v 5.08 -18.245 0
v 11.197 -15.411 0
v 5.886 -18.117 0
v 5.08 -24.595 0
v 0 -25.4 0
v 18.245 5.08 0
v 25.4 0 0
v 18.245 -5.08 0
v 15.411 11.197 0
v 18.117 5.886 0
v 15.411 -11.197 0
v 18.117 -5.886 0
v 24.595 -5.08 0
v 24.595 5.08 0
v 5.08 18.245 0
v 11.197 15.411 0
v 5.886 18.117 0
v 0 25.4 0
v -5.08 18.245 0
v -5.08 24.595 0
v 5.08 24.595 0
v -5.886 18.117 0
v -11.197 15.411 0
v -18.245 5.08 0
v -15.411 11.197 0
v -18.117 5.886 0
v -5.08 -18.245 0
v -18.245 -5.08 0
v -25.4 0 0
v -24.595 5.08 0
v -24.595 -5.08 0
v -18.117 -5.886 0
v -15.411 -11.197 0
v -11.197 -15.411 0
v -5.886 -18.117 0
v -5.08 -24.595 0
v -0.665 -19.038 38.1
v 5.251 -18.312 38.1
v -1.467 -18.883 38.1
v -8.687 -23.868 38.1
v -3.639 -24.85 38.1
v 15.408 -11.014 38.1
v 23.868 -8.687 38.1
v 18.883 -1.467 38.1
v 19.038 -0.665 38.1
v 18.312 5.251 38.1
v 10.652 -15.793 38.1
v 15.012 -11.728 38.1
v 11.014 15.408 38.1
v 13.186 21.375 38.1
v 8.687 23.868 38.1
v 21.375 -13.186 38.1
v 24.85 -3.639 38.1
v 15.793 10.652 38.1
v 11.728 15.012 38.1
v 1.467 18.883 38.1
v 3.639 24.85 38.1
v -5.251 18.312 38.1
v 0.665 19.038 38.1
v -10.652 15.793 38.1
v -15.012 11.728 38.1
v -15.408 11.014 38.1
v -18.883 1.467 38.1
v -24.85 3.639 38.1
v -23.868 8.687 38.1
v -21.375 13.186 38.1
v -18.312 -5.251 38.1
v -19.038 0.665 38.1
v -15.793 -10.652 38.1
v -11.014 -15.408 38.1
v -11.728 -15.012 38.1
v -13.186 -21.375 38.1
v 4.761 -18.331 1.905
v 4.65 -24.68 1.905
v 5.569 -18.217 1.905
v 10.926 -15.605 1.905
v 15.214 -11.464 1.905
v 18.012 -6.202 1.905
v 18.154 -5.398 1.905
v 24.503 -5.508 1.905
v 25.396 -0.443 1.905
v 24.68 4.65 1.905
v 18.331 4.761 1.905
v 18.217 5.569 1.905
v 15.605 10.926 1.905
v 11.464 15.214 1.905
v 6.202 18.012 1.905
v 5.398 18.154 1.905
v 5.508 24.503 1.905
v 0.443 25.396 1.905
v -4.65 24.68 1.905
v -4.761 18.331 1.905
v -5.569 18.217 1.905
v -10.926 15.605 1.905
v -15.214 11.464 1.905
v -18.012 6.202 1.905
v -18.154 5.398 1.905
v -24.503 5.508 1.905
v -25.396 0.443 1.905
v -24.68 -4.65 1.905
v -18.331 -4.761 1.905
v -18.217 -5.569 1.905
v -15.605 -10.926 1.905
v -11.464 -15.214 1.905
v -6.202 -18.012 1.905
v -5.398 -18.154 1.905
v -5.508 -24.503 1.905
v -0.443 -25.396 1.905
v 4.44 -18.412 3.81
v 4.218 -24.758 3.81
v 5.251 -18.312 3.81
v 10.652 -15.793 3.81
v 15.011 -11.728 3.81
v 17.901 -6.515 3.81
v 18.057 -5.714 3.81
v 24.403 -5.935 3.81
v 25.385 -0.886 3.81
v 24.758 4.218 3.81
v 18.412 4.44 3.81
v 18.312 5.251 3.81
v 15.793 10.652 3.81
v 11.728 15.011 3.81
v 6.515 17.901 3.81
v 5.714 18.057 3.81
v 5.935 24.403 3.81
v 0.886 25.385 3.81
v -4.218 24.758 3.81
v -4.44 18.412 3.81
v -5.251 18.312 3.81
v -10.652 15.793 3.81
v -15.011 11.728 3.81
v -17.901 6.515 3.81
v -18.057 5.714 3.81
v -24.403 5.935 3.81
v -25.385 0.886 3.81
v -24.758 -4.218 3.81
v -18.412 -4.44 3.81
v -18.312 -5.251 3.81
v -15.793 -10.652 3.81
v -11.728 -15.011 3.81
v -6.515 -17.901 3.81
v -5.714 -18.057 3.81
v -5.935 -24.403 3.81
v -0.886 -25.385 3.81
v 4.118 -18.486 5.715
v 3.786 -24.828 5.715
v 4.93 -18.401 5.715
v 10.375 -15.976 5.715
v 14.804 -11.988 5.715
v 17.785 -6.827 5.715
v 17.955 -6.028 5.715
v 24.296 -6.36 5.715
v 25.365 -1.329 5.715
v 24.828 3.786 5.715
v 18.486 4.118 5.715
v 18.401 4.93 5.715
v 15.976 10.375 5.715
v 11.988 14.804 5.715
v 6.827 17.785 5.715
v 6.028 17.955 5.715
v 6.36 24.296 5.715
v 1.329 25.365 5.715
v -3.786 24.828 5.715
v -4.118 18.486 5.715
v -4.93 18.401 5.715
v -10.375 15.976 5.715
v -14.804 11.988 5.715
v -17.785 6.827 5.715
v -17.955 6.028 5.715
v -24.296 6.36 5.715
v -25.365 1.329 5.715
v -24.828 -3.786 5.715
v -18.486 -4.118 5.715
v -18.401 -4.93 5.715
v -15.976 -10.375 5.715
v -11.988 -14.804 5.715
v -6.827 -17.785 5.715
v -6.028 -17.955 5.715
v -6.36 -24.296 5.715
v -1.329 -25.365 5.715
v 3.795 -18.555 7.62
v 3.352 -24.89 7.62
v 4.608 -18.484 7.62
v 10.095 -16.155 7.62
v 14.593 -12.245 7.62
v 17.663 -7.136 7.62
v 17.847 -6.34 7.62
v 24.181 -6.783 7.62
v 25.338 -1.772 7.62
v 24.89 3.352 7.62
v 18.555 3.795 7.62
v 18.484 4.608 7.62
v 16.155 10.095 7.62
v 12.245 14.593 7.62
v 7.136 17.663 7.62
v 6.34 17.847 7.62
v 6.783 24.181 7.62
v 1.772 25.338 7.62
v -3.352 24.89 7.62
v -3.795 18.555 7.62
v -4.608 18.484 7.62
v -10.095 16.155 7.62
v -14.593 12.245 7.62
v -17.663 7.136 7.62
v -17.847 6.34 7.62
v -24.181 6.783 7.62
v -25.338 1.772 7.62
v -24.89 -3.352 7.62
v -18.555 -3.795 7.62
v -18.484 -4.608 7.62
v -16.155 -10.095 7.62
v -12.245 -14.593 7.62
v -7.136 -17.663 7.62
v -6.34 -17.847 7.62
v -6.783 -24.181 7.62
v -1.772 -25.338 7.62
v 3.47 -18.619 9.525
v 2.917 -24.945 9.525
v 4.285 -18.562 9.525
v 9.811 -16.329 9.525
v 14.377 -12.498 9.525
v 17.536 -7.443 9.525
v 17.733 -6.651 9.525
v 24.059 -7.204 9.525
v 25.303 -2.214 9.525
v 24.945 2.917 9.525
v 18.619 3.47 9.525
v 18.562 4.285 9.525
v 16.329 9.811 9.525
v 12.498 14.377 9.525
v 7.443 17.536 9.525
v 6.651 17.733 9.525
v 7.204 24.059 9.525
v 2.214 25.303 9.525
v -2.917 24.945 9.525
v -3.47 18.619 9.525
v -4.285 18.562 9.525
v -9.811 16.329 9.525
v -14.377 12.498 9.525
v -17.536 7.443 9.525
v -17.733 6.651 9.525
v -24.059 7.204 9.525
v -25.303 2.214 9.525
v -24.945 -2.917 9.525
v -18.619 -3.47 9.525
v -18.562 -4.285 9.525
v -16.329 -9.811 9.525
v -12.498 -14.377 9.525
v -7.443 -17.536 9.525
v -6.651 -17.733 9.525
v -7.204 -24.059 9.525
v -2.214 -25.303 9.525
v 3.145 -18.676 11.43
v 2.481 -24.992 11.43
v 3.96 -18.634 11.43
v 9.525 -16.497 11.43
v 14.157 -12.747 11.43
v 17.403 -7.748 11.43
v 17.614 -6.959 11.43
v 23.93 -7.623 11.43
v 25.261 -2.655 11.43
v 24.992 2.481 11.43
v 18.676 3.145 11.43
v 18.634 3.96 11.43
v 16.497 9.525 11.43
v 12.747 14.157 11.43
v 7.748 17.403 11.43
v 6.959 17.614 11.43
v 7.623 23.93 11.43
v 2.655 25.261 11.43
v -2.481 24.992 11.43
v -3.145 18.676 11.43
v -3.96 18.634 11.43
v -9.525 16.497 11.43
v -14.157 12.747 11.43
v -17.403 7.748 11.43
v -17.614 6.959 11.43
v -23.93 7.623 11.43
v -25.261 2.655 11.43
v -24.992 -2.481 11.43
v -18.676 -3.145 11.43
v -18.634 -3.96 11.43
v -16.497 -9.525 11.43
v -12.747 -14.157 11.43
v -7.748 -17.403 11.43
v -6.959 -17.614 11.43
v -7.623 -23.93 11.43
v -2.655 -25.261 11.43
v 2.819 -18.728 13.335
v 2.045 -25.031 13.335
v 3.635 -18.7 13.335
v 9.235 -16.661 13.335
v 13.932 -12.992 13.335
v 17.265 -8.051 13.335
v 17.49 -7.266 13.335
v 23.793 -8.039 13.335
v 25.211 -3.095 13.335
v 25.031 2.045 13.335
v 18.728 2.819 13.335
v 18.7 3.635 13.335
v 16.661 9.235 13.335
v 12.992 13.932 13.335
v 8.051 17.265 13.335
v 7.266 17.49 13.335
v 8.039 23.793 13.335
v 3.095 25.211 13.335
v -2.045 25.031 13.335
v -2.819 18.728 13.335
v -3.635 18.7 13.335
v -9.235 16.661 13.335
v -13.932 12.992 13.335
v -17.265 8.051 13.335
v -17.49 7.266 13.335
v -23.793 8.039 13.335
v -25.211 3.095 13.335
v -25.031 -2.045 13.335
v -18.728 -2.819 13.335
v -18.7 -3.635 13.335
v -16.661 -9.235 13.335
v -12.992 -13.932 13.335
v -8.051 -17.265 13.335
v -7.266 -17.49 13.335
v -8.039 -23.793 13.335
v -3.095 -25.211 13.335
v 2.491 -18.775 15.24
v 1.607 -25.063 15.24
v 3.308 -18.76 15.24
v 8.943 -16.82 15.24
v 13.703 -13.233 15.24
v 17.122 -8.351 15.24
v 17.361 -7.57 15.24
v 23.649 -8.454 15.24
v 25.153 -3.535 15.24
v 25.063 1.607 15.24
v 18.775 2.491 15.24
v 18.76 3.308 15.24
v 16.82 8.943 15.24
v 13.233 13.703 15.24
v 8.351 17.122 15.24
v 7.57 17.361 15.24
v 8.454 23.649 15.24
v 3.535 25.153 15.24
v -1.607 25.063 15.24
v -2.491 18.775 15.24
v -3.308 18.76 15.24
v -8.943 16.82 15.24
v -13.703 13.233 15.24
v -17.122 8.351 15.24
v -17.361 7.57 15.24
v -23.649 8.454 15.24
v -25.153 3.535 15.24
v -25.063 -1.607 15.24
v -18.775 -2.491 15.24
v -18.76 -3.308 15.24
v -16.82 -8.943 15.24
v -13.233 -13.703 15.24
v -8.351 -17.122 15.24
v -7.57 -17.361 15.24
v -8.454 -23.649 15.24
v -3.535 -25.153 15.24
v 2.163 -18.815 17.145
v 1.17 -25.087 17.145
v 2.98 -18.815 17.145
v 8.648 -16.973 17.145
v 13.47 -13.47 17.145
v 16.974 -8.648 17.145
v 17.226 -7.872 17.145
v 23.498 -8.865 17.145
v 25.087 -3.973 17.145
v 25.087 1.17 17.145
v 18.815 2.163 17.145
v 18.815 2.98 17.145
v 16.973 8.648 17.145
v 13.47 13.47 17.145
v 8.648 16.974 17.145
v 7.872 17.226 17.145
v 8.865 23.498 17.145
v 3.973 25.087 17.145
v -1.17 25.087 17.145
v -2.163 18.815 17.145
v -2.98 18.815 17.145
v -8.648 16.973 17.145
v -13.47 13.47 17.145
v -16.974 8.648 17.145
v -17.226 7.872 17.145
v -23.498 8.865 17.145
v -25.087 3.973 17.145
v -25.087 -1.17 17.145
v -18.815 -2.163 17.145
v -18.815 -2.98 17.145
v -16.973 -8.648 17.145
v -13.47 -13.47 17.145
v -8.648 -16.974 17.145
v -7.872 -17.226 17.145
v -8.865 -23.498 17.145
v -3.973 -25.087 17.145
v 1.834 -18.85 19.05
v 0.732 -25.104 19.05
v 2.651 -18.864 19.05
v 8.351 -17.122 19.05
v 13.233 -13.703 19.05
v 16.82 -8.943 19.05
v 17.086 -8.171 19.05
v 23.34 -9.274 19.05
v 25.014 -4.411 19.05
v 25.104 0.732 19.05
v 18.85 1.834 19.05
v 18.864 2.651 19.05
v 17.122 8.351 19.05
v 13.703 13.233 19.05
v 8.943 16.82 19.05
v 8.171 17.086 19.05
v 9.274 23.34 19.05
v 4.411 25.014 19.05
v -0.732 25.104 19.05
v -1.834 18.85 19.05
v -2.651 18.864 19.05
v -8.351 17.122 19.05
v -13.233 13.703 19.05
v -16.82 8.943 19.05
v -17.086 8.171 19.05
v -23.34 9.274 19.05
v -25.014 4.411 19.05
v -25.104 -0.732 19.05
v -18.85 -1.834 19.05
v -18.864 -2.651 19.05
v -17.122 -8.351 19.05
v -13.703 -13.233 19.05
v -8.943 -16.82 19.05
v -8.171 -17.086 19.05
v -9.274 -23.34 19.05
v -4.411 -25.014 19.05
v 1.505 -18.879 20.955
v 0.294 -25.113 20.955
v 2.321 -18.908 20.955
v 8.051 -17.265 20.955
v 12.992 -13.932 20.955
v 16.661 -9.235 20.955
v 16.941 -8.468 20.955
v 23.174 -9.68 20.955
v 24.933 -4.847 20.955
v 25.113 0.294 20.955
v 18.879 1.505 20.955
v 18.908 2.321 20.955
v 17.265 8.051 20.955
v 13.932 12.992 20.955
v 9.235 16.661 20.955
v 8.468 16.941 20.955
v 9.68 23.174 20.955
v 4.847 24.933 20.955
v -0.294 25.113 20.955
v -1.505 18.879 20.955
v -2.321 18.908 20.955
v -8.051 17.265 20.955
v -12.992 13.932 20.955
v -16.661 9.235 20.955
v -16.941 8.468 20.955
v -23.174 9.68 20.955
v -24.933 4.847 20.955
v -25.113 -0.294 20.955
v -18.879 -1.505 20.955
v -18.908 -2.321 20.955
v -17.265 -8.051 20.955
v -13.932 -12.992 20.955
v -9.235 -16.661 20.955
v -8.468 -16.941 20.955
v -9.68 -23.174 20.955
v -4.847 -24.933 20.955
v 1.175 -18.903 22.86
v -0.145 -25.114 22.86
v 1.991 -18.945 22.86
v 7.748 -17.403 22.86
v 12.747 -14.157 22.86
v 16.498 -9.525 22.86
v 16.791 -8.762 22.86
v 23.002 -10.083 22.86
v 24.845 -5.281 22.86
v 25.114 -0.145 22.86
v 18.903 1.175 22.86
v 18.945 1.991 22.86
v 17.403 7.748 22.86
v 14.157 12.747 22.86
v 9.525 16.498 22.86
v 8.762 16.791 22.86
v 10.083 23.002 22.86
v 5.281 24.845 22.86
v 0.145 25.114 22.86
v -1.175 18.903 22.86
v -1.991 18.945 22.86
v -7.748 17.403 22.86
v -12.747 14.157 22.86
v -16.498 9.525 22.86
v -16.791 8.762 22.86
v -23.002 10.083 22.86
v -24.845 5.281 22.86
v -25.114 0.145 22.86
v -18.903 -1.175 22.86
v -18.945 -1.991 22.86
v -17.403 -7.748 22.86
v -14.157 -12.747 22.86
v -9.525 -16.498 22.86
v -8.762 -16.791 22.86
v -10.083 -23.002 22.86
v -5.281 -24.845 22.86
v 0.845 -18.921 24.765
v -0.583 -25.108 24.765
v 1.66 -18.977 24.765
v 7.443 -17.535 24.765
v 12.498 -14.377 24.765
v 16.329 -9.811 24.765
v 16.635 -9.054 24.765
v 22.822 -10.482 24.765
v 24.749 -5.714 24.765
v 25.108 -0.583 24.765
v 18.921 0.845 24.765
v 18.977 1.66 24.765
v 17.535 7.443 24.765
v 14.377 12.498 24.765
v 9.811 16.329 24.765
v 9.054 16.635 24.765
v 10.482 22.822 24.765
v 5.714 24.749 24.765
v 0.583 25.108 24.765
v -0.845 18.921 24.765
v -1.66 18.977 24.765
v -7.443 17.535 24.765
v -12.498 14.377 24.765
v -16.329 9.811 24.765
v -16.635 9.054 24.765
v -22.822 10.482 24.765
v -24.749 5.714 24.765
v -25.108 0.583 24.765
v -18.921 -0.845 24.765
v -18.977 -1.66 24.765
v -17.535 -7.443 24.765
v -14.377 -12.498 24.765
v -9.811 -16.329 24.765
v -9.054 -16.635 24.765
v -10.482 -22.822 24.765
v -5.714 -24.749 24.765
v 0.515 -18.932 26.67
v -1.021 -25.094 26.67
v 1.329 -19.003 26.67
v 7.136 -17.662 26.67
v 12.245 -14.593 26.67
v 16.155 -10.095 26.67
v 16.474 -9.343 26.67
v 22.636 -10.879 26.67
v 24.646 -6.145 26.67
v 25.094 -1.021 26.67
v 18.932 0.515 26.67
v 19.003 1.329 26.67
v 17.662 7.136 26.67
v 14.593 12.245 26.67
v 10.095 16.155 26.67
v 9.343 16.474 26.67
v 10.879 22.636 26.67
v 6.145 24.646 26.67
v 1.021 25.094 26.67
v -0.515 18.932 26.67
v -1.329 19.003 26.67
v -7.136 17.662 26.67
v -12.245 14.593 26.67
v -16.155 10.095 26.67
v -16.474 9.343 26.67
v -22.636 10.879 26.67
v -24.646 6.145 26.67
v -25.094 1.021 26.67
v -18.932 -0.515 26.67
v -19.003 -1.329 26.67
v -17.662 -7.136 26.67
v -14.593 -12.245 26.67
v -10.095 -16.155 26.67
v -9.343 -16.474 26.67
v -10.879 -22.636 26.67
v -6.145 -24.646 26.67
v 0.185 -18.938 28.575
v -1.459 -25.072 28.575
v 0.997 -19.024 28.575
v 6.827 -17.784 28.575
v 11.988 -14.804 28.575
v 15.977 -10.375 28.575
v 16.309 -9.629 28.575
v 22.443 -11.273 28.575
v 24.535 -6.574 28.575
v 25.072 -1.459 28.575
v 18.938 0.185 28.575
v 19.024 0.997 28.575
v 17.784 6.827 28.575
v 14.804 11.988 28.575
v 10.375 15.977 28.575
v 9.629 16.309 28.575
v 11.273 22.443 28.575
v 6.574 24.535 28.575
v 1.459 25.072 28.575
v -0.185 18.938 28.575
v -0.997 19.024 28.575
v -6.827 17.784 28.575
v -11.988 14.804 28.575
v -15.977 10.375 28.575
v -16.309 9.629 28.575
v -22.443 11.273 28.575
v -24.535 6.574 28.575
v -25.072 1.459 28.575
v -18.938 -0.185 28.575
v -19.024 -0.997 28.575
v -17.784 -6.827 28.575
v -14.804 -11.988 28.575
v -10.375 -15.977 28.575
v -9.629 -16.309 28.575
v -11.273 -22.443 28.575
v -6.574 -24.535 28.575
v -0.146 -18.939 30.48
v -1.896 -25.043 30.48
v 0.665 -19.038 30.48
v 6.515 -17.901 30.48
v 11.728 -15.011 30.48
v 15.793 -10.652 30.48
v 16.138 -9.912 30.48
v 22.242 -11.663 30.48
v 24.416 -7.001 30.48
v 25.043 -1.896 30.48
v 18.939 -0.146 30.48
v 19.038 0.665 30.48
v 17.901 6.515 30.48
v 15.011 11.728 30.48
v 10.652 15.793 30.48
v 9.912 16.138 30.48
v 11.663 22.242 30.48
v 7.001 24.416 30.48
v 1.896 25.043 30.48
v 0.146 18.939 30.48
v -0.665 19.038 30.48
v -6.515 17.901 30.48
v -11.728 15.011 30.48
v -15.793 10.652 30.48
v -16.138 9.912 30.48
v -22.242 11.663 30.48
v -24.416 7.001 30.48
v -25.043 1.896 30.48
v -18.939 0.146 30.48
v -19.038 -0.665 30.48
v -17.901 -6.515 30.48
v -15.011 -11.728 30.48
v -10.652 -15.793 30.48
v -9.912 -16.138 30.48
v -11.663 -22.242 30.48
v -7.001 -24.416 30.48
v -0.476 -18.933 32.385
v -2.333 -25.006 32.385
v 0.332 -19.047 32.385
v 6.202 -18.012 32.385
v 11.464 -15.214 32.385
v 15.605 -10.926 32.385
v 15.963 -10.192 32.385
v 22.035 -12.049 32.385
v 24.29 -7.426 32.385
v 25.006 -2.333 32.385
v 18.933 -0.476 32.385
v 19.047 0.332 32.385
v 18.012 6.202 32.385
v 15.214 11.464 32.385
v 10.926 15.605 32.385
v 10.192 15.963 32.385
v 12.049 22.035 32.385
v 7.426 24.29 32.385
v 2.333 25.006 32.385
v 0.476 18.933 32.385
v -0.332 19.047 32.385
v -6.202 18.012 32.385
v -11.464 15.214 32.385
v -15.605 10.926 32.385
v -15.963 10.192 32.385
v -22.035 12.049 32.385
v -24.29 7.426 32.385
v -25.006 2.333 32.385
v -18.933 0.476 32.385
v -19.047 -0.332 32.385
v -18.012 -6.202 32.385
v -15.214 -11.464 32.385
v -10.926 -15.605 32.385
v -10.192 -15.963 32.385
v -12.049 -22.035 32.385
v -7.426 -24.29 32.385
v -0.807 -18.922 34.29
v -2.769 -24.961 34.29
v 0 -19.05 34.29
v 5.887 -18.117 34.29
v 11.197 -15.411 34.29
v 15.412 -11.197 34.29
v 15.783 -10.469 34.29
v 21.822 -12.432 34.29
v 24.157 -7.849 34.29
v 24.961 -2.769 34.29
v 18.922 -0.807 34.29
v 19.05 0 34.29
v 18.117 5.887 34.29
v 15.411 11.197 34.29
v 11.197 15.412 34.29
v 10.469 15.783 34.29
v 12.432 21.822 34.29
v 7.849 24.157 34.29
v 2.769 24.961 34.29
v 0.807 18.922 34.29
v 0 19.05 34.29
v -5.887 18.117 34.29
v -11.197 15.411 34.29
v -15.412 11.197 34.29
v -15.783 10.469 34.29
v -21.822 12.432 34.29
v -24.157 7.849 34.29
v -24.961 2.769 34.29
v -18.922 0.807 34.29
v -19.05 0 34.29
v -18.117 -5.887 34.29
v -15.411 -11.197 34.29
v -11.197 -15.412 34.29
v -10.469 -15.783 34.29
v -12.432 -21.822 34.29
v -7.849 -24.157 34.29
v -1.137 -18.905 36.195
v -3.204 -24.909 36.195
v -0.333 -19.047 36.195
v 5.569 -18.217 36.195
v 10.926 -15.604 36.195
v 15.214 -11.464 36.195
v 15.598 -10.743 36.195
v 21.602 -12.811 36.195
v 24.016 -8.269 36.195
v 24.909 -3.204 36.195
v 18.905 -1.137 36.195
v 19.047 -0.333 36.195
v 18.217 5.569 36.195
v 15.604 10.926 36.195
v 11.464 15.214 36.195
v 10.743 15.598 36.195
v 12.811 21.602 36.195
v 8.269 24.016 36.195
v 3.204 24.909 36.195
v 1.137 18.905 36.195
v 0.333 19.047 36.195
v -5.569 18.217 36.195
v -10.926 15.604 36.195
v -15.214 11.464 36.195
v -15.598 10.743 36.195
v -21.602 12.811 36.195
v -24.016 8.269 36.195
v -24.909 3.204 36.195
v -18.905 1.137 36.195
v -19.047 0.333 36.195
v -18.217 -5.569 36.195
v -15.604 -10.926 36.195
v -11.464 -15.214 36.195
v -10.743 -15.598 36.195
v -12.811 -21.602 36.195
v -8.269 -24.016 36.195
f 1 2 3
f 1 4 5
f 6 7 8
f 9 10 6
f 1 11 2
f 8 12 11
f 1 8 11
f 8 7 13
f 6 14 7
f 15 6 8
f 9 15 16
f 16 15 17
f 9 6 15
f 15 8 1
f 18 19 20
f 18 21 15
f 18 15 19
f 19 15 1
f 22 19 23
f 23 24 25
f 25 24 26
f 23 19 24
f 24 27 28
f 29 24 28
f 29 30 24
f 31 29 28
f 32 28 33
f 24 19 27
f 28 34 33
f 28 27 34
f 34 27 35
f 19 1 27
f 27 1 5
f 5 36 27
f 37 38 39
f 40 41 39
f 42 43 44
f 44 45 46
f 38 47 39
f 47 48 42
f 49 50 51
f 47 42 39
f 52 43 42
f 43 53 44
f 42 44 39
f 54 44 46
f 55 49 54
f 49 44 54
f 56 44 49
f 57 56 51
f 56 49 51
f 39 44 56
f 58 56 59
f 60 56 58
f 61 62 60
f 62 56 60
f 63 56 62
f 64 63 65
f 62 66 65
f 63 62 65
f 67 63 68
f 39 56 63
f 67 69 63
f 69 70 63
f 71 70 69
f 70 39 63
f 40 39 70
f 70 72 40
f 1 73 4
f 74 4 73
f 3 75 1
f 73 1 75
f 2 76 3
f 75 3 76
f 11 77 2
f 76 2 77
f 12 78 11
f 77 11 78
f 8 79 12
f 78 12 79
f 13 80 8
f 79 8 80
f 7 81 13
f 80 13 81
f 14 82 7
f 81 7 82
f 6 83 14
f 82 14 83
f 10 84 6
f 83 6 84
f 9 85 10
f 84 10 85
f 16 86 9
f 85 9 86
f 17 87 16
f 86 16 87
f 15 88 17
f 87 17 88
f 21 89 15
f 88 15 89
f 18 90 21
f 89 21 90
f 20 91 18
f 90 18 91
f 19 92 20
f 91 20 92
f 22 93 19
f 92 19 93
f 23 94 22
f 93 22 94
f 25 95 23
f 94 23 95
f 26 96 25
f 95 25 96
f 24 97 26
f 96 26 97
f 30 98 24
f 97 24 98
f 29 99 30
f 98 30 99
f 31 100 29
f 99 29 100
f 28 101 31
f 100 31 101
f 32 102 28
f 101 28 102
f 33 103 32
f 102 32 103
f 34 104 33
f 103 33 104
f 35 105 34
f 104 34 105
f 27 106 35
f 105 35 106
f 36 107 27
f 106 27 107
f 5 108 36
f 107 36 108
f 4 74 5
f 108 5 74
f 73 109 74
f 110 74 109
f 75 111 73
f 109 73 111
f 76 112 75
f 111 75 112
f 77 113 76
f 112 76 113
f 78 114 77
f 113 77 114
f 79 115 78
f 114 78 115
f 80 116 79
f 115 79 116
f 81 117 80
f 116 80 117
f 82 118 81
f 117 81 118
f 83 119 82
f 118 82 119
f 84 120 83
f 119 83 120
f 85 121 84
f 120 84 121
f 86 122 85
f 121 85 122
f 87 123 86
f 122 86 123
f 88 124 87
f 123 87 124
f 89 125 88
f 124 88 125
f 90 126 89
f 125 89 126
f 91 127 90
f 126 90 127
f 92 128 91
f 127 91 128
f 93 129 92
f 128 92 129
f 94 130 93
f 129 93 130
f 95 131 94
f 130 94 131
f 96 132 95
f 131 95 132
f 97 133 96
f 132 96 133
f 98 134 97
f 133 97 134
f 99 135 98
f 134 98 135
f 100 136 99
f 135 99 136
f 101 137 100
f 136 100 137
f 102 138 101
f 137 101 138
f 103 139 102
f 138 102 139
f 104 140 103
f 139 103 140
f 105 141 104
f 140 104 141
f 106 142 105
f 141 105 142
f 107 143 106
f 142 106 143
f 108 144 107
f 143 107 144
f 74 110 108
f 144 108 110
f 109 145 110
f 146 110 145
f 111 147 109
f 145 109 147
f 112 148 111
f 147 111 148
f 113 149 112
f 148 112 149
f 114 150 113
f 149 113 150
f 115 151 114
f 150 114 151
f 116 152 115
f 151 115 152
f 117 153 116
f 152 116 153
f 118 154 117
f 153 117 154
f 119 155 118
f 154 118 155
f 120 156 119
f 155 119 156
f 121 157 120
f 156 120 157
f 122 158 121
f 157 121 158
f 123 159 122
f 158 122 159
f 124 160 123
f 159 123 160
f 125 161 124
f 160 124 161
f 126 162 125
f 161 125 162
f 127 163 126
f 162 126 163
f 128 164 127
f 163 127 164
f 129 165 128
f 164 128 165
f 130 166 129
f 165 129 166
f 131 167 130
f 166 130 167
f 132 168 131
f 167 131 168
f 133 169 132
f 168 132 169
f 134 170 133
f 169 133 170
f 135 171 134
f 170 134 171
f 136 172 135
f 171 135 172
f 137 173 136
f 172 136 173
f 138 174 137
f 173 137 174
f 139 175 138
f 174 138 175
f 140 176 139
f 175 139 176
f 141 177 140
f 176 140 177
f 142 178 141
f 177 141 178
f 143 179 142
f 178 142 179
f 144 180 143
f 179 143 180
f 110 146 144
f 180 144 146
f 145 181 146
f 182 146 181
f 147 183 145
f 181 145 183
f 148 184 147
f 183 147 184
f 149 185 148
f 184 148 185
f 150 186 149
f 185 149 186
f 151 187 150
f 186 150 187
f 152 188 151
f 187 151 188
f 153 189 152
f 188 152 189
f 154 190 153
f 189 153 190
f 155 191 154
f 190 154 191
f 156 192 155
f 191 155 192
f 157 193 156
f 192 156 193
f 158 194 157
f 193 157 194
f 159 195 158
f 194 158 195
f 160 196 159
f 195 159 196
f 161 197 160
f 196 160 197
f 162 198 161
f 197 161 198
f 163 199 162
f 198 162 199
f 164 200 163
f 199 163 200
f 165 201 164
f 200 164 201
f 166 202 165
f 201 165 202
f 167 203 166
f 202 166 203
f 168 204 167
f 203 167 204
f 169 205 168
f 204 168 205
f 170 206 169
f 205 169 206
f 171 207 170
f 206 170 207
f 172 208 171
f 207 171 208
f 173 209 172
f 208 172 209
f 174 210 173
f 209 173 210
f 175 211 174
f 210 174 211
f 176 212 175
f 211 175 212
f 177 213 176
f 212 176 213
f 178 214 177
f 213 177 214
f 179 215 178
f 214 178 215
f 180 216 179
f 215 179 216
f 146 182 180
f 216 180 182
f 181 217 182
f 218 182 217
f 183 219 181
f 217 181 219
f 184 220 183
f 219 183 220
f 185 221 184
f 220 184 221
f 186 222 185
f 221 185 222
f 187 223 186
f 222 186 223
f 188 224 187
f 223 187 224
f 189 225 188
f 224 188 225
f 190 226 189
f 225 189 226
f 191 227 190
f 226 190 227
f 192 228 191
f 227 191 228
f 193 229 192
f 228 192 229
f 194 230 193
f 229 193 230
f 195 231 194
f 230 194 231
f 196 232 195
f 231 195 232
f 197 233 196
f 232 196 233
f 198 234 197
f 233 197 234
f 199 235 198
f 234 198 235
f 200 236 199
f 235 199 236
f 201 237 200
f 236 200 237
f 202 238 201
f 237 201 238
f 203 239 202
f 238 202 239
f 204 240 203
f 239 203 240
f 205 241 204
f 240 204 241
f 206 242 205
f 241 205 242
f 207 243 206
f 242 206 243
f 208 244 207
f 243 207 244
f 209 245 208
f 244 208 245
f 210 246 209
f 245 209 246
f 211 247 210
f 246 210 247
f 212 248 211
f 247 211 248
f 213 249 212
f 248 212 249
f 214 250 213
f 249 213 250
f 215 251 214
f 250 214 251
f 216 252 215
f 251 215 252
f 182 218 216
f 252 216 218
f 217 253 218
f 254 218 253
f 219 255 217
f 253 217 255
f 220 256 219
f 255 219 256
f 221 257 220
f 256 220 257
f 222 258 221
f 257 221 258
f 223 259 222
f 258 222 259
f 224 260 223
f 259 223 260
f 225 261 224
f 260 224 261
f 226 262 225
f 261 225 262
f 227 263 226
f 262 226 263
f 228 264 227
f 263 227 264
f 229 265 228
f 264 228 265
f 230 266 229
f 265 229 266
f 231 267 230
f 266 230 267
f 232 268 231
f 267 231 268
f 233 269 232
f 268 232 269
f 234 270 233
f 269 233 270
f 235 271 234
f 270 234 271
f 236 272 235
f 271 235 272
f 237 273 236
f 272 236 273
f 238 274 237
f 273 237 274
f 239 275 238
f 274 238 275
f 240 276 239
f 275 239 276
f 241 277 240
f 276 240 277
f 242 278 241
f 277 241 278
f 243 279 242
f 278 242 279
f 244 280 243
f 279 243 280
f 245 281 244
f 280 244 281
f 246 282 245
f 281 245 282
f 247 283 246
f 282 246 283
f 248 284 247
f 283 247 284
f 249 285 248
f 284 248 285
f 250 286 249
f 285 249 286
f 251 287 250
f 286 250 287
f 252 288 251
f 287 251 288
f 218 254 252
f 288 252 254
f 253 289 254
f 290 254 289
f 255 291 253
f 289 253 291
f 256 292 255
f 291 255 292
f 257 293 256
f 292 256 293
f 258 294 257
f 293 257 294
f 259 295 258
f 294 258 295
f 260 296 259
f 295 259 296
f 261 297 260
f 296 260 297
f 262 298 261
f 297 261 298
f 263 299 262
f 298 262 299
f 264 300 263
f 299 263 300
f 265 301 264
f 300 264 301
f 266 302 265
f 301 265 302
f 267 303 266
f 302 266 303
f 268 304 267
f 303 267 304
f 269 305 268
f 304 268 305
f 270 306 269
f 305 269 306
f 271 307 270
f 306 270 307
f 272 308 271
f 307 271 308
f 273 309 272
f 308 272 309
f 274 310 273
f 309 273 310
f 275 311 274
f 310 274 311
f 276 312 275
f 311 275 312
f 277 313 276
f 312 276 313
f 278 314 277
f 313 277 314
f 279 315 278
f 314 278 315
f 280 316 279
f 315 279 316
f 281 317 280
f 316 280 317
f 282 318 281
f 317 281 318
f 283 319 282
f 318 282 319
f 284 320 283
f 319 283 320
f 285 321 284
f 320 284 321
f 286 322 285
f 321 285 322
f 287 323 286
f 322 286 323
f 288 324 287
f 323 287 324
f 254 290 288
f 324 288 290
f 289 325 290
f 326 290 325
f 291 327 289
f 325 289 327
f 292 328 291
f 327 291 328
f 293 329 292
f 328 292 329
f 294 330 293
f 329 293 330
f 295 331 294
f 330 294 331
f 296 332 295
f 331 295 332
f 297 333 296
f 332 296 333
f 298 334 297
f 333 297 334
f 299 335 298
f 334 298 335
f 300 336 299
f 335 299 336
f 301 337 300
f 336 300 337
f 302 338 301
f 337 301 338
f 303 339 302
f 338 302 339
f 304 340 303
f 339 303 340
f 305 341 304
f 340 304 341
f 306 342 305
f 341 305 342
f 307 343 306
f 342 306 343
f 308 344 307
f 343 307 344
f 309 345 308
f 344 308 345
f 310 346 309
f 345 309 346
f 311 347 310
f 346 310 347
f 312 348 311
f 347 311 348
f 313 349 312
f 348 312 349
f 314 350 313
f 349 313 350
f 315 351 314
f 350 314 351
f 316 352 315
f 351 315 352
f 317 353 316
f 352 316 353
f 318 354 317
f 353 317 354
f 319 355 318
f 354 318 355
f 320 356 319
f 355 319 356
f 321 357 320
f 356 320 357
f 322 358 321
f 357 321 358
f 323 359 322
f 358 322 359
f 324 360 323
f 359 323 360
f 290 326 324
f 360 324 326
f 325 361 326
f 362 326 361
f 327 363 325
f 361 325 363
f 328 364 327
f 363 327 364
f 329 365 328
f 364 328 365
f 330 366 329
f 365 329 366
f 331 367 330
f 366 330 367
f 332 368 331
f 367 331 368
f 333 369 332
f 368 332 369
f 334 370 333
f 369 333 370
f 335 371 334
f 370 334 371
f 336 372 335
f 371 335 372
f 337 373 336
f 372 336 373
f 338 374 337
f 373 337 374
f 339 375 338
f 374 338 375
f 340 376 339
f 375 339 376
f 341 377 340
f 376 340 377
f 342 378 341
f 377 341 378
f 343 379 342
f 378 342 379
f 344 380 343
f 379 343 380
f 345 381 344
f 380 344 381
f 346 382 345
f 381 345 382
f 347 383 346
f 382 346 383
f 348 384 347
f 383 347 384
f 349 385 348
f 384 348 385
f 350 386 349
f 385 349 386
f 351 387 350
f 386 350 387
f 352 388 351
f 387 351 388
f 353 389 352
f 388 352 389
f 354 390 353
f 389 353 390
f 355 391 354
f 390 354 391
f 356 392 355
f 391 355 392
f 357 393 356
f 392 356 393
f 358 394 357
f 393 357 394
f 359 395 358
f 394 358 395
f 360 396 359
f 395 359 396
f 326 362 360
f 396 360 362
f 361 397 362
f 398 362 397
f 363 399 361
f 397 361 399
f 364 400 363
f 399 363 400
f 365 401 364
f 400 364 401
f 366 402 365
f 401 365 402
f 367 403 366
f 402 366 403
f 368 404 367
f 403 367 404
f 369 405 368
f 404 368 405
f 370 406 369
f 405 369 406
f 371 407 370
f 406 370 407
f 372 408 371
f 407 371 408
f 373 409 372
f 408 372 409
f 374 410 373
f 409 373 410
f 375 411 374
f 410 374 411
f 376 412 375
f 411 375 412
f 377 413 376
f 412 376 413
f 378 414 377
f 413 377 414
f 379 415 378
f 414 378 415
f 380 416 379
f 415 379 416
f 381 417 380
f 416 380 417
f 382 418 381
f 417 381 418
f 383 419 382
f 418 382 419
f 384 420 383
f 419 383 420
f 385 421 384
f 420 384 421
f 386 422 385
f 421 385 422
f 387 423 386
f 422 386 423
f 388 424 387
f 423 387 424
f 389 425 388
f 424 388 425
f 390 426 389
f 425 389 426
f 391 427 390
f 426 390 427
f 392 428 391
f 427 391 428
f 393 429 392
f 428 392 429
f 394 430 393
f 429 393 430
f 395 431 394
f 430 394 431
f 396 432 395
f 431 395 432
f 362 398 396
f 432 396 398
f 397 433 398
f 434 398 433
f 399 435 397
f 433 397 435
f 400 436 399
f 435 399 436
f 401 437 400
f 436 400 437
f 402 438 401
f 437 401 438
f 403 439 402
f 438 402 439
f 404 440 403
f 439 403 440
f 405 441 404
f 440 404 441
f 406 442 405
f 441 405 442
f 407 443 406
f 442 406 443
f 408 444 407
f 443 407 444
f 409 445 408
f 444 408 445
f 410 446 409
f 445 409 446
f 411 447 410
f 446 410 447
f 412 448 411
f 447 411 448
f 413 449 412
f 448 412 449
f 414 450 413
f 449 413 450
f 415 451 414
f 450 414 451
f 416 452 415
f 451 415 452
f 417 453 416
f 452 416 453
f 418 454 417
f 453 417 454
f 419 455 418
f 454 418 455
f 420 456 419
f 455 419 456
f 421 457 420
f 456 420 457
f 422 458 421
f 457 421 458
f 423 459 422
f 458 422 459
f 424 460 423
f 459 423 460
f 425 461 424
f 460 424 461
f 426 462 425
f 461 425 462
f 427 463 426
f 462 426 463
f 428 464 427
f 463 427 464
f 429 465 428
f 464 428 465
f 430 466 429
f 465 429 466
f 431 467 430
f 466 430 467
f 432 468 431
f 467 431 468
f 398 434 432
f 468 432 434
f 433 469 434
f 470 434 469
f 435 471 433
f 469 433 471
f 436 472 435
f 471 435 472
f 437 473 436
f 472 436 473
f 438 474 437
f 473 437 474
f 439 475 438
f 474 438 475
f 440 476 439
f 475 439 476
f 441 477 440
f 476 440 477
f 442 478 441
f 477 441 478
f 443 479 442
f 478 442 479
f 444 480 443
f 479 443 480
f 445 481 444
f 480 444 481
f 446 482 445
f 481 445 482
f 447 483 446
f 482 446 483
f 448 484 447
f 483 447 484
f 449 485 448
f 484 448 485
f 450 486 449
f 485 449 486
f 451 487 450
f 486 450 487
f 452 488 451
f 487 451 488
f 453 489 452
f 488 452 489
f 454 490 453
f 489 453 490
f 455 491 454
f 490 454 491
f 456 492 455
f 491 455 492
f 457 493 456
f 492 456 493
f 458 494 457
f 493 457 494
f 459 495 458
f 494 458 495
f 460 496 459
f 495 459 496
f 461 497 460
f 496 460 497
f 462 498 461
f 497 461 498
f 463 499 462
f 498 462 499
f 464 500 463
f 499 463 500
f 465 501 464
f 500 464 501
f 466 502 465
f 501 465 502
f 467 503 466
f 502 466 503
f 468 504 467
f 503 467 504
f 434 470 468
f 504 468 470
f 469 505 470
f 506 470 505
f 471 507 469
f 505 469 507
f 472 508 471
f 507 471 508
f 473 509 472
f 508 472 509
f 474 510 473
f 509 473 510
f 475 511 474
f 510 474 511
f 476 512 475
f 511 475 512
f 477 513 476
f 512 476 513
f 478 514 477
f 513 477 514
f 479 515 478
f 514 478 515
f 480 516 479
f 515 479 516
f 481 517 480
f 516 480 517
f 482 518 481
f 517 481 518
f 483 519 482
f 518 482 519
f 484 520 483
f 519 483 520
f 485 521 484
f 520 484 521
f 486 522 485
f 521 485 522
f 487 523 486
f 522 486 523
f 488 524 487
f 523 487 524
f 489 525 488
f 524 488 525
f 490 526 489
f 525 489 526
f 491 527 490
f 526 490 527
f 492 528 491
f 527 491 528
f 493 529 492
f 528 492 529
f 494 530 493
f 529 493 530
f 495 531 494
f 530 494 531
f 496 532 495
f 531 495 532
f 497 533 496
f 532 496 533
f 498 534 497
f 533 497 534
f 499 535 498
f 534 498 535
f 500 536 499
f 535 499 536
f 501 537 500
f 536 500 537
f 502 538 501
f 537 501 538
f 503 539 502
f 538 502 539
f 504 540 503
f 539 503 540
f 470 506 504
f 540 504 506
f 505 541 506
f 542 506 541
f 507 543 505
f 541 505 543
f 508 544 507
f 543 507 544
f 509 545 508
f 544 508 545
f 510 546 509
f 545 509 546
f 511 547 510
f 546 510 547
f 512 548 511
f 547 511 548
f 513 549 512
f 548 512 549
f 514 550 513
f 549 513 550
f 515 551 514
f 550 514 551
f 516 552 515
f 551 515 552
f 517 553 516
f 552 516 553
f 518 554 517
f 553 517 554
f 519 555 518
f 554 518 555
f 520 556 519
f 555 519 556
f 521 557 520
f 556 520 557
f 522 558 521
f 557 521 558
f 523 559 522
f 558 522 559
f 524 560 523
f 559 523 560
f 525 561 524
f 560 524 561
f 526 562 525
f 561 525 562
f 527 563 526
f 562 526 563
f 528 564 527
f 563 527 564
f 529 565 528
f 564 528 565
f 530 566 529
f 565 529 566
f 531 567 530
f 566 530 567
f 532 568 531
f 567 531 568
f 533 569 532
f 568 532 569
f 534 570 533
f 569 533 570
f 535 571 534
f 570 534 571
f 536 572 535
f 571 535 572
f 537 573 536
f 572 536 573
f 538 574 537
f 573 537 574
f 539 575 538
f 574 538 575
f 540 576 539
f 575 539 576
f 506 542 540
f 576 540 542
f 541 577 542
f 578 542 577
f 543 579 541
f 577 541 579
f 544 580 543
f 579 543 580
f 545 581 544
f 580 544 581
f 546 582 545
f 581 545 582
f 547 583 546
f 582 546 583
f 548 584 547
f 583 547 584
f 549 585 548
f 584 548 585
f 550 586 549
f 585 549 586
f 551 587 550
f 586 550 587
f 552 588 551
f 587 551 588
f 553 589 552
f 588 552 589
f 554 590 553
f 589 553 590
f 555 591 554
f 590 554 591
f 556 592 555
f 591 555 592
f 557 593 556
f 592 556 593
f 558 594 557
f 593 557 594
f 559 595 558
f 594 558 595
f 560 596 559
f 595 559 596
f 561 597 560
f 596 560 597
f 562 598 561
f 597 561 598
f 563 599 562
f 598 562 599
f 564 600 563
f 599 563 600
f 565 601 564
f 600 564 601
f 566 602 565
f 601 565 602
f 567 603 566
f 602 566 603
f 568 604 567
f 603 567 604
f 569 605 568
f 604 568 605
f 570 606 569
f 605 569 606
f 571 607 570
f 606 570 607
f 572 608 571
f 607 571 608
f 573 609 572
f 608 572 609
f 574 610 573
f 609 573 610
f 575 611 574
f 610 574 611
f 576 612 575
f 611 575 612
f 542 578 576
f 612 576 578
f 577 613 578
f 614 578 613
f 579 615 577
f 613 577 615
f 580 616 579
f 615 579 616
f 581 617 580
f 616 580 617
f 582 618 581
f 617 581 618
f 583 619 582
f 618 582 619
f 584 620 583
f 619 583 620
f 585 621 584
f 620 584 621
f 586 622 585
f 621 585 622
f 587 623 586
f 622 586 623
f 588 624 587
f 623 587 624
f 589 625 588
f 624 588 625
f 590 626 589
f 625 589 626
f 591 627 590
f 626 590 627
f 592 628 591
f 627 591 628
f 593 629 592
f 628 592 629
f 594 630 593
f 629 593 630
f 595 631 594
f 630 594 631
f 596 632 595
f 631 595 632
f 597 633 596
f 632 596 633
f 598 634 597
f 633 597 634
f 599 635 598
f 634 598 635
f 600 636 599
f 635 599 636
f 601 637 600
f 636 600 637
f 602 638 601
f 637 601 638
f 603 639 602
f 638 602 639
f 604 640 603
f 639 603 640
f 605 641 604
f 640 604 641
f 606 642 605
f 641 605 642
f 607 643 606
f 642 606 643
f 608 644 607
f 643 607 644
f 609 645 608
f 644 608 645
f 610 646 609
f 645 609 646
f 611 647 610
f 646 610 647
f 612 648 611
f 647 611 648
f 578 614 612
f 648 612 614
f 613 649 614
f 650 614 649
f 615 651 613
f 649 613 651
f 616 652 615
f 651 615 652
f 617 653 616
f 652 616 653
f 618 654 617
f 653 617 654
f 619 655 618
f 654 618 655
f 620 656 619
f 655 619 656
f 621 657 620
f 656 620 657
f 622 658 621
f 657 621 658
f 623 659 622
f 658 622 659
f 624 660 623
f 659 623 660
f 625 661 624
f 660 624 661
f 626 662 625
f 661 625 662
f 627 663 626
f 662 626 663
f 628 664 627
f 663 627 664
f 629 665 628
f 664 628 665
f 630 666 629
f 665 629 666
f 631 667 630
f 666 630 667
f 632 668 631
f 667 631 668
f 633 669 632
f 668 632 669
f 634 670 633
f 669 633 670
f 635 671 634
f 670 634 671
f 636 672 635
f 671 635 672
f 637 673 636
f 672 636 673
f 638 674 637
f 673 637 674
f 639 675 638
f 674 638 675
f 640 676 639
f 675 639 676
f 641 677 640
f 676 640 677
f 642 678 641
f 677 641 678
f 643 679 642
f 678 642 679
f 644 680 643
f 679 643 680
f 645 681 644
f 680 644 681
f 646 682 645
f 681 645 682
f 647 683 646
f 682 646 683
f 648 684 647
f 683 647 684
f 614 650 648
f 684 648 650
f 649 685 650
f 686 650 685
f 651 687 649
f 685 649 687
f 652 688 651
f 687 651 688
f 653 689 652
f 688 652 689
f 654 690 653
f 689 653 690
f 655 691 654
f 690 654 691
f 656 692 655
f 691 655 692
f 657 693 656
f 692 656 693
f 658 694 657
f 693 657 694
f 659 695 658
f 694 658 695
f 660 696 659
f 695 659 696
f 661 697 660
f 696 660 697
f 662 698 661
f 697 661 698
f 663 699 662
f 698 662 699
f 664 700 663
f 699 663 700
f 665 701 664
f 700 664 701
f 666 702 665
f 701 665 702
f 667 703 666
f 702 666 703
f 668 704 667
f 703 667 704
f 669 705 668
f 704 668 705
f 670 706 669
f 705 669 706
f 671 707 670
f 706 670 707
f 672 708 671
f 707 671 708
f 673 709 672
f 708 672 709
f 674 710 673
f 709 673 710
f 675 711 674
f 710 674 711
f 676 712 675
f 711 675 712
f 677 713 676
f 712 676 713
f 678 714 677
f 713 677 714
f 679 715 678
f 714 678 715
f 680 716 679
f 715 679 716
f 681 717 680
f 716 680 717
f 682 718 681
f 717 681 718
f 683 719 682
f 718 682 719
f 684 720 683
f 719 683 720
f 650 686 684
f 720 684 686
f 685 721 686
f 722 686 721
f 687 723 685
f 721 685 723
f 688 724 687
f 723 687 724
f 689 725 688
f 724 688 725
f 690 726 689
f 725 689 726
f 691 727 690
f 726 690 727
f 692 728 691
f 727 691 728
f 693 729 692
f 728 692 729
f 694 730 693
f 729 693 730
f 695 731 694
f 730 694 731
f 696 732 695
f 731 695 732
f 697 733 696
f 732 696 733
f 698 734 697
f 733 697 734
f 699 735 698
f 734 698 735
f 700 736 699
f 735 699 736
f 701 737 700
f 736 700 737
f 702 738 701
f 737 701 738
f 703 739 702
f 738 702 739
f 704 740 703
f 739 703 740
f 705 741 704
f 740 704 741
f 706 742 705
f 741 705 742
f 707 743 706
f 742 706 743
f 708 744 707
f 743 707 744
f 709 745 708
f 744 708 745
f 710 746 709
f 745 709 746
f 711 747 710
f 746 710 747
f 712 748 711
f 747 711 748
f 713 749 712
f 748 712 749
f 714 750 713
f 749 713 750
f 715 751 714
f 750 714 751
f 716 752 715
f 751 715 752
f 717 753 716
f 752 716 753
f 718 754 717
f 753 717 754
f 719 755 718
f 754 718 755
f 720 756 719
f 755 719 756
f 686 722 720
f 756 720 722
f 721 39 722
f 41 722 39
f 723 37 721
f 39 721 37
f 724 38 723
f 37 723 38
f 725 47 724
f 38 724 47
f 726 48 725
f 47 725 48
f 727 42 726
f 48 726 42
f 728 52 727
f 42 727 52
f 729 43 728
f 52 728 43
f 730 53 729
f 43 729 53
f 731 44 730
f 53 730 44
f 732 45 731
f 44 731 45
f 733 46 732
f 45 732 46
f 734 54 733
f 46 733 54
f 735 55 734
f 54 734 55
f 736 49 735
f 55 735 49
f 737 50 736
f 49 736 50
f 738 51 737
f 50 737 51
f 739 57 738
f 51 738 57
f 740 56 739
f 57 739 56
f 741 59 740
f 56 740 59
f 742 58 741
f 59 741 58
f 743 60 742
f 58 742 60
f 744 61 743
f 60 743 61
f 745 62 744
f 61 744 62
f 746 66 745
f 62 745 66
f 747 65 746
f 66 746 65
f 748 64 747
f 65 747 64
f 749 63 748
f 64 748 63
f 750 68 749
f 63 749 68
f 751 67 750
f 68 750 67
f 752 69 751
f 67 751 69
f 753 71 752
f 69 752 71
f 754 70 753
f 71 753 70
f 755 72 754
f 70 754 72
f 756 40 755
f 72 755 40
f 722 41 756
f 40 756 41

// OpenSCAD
module Fins(count=2, width=.4, height=1.5,
            major=1, minor=0.75,
            slices=20, twist=20, $fn=20) {
  color("Orange")
  render()
  linear_extrude(height=height, twist=twist, slices=slices)
  intersection() {

    // Main fin geometry
    union() {

      for(i = [0 : count-1]) {
        // Fin
        rotate([0,0,180/count*i])
        translate([-width/2, -major*1.5])
        square([width, major*3]);
      }

      // Fin Wall
      circle(r=minor);
    }

    // Intersect with major radius to smooth the edges
    circle(r=major);
  }
}

scale([25.4, 25.4, 25.4])
difference() {
  Fins();

  *translate([-2, 0, -1])
  cube([4,4,4]);
}
